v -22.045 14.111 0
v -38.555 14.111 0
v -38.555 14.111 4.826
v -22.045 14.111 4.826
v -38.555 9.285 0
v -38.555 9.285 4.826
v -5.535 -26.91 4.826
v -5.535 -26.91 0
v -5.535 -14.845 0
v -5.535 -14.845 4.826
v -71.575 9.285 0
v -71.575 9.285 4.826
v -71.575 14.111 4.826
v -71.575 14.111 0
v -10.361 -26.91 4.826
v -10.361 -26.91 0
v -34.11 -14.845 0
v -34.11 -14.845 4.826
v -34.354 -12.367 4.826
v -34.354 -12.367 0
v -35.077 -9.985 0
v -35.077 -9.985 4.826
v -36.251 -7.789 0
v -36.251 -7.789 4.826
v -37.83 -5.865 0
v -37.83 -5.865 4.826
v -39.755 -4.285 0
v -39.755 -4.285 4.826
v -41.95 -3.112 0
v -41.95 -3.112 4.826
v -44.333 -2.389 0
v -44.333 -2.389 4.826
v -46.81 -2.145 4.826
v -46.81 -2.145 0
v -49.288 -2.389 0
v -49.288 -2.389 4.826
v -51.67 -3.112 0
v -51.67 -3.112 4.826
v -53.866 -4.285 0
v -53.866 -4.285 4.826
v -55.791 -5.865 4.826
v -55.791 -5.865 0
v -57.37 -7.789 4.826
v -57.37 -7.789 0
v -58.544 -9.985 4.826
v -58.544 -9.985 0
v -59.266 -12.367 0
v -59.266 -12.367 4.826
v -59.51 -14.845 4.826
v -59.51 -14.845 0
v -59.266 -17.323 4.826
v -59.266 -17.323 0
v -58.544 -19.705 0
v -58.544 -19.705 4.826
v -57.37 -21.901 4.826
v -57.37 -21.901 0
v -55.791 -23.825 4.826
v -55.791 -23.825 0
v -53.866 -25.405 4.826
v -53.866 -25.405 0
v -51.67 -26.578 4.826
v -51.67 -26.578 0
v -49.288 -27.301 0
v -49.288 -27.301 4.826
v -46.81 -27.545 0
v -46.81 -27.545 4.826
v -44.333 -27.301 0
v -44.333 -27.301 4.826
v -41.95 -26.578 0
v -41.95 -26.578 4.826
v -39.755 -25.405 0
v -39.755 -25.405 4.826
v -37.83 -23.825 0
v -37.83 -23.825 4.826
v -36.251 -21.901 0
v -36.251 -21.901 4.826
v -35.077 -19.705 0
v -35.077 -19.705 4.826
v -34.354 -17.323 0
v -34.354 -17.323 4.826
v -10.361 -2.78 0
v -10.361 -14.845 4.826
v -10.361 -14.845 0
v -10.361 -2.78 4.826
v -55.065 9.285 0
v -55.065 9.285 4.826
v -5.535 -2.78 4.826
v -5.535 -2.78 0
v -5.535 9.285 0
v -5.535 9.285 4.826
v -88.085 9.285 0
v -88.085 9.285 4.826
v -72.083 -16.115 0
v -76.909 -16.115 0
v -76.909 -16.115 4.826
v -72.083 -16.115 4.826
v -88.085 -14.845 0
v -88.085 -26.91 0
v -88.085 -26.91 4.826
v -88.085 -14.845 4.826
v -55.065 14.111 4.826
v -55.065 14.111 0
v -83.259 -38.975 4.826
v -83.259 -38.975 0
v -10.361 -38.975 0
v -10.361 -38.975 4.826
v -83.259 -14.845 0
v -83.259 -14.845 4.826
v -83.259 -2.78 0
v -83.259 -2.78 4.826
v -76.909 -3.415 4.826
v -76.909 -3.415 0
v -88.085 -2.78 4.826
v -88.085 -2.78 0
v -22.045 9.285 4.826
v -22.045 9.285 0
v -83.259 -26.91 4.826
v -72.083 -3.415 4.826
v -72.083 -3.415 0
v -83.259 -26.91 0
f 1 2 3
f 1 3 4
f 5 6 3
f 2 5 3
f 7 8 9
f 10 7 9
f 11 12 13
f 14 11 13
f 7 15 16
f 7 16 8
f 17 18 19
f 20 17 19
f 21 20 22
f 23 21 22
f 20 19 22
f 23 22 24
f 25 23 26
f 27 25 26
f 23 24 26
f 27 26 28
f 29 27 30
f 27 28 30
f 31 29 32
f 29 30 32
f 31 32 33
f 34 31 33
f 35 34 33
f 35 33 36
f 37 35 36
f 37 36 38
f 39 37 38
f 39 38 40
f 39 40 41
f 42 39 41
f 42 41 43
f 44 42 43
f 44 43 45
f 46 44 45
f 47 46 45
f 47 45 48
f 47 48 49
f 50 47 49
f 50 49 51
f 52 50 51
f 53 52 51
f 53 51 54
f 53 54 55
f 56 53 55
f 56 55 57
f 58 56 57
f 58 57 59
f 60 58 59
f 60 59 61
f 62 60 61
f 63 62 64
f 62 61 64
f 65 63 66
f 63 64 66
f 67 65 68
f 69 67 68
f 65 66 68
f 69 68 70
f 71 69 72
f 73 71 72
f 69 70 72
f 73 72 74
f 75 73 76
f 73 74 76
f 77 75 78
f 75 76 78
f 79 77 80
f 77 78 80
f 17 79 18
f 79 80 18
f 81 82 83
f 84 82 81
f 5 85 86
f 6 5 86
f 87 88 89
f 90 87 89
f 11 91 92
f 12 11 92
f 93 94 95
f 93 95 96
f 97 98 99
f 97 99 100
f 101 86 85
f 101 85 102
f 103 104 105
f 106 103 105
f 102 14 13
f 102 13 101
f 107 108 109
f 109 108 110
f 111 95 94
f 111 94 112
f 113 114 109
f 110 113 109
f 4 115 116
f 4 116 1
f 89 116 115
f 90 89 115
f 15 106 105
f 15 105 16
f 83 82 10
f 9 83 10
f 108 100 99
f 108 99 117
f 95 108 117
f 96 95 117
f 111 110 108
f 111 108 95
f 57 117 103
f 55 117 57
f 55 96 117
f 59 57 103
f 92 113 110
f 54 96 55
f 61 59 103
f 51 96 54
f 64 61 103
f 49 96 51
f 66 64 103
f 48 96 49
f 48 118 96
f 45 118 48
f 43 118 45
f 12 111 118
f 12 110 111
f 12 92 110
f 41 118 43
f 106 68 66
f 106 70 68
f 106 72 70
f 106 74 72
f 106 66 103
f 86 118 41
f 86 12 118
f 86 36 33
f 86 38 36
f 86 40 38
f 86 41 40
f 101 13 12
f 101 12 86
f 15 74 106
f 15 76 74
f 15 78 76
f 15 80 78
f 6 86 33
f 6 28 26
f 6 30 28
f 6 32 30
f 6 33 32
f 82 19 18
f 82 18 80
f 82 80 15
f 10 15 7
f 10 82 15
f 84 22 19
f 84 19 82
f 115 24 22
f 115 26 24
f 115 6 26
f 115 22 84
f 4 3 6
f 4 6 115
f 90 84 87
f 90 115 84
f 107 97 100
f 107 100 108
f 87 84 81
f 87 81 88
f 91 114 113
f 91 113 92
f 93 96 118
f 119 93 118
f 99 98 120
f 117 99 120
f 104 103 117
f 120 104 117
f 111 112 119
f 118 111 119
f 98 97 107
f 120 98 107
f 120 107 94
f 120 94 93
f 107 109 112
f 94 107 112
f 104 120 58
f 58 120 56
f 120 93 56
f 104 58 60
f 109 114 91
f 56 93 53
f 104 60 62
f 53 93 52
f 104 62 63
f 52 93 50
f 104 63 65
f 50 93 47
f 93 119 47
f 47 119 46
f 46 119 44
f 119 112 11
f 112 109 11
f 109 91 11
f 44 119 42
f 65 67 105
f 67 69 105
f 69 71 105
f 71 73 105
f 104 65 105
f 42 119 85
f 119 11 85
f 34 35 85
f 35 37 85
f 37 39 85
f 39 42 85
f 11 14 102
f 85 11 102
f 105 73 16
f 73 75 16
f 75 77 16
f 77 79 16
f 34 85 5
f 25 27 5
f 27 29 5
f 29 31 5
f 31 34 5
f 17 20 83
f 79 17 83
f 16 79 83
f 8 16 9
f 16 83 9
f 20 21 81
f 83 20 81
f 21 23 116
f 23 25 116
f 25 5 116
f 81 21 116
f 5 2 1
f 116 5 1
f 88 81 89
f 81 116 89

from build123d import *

# Parameters (mm, degrees)
SKETCH1_W                = 82.55
SKETCH1_H                = 53.086
BOSS_EXTRUDE1_DEPTH      = 4.826
CUT_EXTRUDE1_START       = -88.085249325
CUT_EXTRUDE1_OUTLINE_W   = 4.826
CUT_EXTRUDE1_OUTLINE_H   = 4.826
CUT_EXTRUDE1_DEPTH       = 16.51
CUT_EXTRUDE1_START_2     = -55.065249325
CUT_EXTRUDE1_2_OUTLINE_W = 4.826
CUT_EXTRUDE1_2_OUTLINE_H = 4.826
CUT_EXTRUDE1_2_DEPTH     = 16.51
CUT_EXTRUDE1_START_3     = -22.045249325
CUT_EXTRUDE1_3_OUTLINE_W = 4.826
CUT_EXTRUDE1_3_OUTLINE_H = 4.826
CUT_EXTRUDE1_3_DEPTH     = 16.51
SKETCH3_W                = 4.826
SKETCH3_H                = 12.065
CUT_EXTRUDE2_DEPTH       = 97.443575108
SKETCH4_R                = 12.7
CUT_EXTRUDE3_DEPTH       = 97.443575108
SKETCH5_W                = 4.826
SKETCH5_H                = 12.7
CUT_EXTRUDE4_DEPTH       = 97.443575108


# Read off the part's stored shape, not the designer's step: Cut-Extrude1
with BuildPart() as part:
    # Sketch1 → Boss-Extrude1 (new body)
    with BuildSketch(Plane.XY):
        with Locations((-46.810249325, -12.432142782)):
            Rectangle(SKETCH1_W, SKETCH1_H)
    extrude(amount=BOSS_EXTRUDE1_DEPTH)

    # Cut-Extrude1 outline → Cut-Extrude1 (cut)
    with BuildSketch(Plane.YZ.offset(CUT_EXTRUDE1_START)):
        with Locations((11.697857218, 2.413)):
            Rectangle(CUT_EXTRUDE1_OUTLINE_W, CUT_EXTRUDE1_OUTLINE_H)
    extrude(amount=CUT_EXTRUDE1_DEPTH, mode=Mode.SUBTRACT)

    # Cut-Extrude1 2 outline → Cut-Extrude1 2 (cut)
    with BuildSketch(Plane.YZ.offset(CUT_EXTRUDE1_START_2)):
        with Locations((11.697857218, 2.413)):
            Rectangle(CUT_EXTRUDE1_2_OUTLINE_W, CUT_EXTRUDE1_2_OUTLINE_H)
    extrude(amount=CUT_EXTRUDE1_2_DEPTH, mode=Mode.SUBTRACT)

    # Cut-Extrude1 3 outline → Cut-Extrude1 3 (cut)
    with BuildSketch(Plane.YZ.offset(CUT_EXTRUDE1_START_3)):
        with Locations((11.697857218, 2.413)):
            Rectangle(CUT_EXTRUDE1_3_OUTLINE_W, CUT_EXTRUDE1_3_OUTLINE_H)
    extrude(amount=CUT_EXTRUDE1_3_DEPTH, mode=Mode.SUBTRACT)

    # Sketch3 → Cut-Extrude2 (cut, through all)
    with BuildSketch(Plane.XY.offset(4.826)):
        with Locations((-85.672249325, -32.942642782)):
            Rectangle(SKETCH3_W, SKETCH3_H)
        with Locations((-85.672249325, -8.812642782)):
            Rectangle(SKETCH3_W, SKETCH3_H)
        with Locations((-7.948249325, -32.942642782)):
            Rectangle(SKETCH3_W, SKETCH3_H)
        with Locations((-7.948249325, -8.812642782)):
            Rectangle(SKETCH3_W, SKETCH3_H)
    extrude(amount=-CUT_EXTRUDE2_DEPTH, mode=Mode.SUBTRACT)

    # Sketch4 → Cut-Extrude3 (cut, through all)
    with BuildSketch(Plane.XY.offset(4.826)):
        with Locations((-46.810249325, -14.845142782)):
            Circle(SKETCH4_R)
    extrude(amount=-CUT_EXTRUDE3_DEPTH, mode=Mode.SUBTRACT)

    # Sketch5 → Cut-Extrude4 (cut, through all)
    with BuildSketch(Plane.XY.offset(4.826)):
        with Locations((-74.496249325, -9.765142782)):
            Rectangle(SKETCH5_W, SKETCH5_H)
    extrude(amount=-CUT_EXTRUDE4_DEPTH, mode=Mode.SUBTRACT)


solid = part.part
